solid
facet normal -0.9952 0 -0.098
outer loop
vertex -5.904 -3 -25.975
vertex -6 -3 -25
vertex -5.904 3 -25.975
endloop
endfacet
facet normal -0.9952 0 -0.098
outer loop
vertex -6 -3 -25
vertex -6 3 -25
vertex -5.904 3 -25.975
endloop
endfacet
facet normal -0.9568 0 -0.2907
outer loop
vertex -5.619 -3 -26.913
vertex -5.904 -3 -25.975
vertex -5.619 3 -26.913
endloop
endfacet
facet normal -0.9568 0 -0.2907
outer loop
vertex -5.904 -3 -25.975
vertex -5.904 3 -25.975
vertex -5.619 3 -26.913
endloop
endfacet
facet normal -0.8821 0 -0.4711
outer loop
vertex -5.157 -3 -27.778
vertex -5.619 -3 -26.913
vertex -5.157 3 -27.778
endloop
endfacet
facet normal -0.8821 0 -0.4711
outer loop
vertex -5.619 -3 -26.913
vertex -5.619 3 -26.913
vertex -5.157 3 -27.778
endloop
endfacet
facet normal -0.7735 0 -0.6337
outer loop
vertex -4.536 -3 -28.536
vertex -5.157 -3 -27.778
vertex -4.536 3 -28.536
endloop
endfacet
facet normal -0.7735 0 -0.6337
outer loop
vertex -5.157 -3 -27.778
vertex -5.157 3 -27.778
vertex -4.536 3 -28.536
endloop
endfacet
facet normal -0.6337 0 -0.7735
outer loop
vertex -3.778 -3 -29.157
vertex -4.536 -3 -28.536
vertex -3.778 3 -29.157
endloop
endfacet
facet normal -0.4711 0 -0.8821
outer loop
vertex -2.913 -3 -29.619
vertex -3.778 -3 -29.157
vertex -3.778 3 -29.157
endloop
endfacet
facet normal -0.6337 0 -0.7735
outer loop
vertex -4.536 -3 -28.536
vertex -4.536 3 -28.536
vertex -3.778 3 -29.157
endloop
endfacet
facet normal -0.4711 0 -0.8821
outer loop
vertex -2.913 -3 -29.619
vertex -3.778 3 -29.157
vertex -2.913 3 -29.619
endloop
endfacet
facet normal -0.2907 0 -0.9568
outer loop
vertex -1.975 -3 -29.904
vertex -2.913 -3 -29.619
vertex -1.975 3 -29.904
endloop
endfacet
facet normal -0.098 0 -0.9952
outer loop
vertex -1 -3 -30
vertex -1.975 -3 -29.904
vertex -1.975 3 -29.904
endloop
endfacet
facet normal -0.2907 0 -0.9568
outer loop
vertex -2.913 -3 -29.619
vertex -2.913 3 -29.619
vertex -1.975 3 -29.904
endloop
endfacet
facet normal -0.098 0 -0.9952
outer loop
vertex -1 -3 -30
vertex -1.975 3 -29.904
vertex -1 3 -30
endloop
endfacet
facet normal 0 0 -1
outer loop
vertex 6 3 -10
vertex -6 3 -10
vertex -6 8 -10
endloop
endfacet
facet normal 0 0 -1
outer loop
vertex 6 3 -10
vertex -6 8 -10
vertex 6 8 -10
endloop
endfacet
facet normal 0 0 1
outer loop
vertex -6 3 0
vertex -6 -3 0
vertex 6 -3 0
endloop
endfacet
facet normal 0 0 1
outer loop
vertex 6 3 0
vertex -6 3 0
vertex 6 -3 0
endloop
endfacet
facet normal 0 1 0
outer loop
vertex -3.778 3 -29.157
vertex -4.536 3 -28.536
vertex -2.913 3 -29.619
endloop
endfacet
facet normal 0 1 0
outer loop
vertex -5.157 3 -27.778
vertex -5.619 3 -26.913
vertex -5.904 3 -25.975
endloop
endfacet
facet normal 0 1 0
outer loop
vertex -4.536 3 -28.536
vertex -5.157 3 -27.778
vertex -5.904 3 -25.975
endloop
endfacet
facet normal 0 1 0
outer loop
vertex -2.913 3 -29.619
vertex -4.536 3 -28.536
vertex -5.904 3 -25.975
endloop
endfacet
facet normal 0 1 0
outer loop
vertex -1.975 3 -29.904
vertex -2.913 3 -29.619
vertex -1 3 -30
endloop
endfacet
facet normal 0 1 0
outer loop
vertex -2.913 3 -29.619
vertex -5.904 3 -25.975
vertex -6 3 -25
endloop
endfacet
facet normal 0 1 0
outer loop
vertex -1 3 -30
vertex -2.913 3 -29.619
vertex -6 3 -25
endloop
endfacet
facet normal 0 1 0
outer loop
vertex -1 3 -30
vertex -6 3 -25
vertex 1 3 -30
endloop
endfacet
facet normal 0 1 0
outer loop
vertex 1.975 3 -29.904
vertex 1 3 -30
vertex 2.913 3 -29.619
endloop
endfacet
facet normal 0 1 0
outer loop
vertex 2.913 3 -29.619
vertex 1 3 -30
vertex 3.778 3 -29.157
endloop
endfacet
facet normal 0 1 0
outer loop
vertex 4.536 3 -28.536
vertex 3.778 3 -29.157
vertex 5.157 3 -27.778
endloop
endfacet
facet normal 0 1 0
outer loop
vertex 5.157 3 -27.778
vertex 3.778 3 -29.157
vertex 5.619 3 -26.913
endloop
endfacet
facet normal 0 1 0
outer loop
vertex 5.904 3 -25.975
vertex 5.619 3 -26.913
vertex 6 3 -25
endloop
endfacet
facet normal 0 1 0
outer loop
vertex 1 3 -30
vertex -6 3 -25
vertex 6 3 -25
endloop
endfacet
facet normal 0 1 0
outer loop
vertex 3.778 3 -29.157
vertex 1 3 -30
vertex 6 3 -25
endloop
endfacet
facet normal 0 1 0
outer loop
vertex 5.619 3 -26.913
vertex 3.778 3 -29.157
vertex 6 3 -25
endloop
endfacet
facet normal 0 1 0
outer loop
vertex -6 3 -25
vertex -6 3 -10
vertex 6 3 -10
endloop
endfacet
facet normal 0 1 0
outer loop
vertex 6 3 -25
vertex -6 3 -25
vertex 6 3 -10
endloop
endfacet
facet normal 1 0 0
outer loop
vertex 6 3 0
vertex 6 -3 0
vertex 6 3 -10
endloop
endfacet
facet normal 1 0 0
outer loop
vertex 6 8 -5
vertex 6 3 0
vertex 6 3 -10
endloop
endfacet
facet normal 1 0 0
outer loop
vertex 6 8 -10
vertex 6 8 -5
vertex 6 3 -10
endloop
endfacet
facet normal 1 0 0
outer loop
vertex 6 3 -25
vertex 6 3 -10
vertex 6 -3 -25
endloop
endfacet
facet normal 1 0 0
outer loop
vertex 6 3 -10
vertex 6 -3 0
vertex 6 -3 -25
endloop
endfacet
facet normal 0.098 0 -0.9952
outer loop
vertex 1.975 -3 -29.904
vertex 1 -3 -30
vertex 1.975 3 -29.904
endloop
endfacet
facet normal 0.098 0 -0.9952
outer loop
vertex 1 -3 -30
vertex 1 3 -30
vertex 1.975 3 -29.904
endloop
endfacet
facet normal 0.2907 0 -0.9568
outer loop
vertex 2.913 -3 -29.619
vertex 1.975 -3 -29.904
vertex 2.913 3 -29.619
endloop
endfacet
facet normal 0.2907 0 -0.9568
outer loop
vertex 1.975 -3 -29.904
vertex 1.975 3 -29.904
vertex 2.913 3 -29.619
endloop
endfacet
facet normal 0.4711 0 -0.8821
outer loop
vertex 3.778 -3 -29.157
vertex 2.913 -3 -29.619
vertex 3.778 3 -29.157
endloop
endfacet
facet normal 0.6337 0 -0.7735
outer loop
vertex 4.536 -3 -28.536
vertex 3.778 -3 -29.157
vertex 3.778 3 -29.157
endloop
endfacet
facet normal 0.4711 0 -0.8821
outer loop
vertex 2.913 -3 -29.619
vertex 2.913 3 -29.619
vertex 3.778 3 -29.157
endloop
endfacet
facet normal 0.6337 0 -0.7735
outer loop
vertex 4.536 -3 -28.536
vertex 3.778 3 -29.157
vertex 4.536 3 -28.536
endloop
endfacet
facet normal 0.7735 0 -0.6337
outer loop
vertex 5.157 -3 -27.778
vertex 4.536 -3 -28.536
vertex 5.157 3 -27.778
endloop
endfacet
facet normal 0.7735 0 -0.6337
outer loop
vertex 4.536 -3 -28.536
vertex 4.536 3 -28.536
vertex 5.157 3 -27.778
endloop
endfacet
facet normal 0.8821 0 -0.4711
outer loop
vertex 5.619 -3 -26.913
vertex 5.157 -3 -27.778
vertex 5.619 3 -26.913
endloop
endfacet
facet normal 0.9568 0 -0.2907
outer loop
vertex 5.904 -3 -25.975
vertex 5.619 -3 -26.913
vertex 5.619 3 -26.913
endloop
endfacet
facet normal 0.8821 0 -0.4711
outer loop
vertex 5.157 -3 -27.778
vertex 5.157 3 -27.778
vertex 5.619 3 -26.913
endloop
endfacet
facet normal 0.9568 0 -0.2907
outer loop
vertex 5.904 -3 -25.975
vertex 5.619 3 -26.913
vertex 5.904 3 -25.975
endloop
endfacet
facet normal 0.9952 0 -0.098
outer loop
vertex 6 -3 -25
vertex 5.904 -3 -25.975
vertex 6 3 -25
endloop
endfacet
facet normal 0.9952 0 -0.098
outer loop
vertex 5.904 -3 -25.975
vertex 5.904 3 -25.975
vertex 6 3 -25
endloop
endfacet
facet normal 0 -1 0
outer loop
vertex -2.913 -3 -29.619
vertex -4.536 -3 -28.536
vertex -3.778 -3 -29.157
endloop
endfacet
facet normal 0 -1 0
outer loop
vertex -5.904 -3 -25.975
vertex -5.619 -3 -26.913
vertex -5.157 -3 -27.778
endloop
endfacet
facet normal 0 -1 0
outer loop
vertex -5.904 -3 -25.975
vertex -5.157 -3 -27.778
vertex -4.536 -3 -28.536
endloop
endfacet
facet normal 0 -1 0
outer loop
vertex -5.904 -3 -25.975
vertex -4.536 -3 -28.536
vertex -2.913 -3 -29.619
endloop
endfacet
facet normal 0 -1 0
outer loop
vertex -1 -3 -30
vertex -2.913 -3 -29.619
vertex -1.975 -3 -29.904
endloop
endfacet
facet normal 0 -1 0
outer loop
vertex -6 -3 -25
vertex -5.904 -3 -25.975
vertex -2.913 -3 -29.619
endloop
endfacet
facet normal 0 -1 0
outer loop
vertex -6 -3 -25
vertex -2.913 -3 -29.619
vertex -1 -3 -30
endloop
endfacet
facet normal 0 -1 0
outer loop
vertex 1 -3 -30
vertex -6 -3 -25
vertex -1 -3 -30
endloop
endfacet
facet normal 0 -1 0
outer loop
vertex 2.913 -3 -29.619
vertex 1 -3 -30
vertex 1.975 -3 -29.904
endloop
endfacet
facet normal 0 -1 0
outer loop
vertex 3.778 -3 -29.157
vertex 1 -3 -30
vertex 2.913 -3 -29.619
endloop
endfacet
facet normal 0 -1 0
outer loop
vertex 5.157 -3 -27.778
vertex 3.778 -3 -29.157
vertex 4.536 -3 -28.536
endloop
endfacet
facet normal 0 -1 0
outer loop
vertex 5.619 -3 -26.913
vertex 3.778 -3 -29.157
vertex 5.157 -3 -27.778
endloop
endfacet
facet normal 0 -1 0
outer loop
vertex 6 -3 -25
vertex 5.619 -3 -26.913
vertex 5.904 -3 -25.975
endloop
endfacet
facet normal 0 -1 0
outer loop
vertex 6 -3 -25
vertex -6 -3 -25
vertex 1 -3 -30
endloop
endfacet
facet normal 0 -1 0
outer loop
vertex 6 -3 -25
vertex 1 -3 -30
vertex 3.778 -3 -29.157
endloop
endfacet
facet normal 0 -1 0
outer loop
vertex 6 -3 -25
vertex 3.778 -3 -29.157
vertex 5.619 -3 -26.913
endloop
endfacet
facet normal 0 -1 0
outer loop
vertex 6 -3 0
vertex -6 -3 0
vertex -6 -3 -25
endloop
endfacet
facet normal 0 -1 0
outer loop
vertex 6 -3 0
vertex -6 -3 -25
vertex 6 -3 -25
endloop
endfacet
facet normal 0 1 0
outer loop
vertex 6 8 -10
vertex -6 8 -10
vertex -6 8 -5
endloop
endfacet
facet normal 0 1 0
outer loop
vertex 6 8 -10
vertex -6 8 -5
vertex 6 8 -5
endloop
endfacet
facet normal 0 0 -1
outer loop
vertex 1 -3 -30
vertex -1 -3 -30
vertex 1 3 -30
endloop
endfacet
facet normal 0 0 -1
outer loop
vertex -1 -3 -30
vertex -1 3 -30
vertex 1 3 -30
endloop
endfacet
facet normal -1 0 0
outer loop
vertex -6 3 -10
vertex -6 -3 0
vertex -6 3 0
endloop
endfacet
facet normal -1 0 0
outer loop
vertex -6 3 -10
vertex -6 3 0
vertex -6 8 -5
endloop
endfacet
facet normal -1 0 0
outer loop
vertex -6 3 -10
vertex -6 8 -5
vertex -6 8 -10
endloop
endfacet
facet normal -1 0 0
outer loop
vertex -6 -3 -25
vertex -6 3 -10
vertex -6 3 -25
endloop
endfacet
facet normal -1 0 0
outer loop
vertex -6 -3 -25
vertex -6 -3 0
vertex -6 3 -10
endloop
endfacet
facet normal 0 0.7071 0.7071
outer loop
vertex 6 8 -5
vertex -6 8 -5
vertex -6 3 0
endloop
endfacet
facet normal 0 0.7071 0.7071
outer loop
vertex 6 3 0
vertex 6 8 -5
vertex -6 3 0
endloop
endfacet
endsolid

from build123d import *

# Parameters (mm, degrees)
SKETCH1_W           = 12
SKETCH1_H           = 6
BOSS_EXTRUDE1_DEPTH = 30
SKETCH2_W           = 12
SKETCH2_H           = 10
BOSS_EXTRUDE2_DEPTH = 5
CUT_EXTRUDE1_DEPTH  = 34.286633954
FILLET1_R           = 5


with BuildPart() as part:
    # Sketch1 → Boss-Extrude1 (new body)
    with BuildSketch(Plane.XY):
        Rectangle(SKETCH1_W, SKETCH1_H)
    extrude(amount=-BOSS_EXTRUDE1_DEPTH)

    # Sketch2 → Boss-Extrude2 (add)
    with BuildSketch(Plane(origin=(0, 3, 0), x_dir=(1, 0, 0), z_dir=(0, 1, 0))):
        with Locations((0, 5)):
            Rectangle(SKETCH2_W, SKETCH2_H)
    extrude(amount=BOSS_EXTRUDE2_DEPTH)

    # Sketch3 → Cut-Extrude1 (cut, through all)
    with BuildSketch(Plane(origin=(6, 0, 0), x_dir=(0, 0, -1), z_dir=(1, 0, 0))):
        Polygon((5, 8), (0, 3), (0, 8), align=None)
    extrude(amount=-CUT_EXTRUDE1_DEPTH, mode=Mode.SUBTRACT)

    # Fillet1
    fillet1_edges = [part.edges().sort_by_distance(p)[0] for p in [
        (-6, 0, -30),
        (6, 0, -30),
    ]]
    fillet(fillet1_edges, radius=FILLET1_R)


solid = part.part
